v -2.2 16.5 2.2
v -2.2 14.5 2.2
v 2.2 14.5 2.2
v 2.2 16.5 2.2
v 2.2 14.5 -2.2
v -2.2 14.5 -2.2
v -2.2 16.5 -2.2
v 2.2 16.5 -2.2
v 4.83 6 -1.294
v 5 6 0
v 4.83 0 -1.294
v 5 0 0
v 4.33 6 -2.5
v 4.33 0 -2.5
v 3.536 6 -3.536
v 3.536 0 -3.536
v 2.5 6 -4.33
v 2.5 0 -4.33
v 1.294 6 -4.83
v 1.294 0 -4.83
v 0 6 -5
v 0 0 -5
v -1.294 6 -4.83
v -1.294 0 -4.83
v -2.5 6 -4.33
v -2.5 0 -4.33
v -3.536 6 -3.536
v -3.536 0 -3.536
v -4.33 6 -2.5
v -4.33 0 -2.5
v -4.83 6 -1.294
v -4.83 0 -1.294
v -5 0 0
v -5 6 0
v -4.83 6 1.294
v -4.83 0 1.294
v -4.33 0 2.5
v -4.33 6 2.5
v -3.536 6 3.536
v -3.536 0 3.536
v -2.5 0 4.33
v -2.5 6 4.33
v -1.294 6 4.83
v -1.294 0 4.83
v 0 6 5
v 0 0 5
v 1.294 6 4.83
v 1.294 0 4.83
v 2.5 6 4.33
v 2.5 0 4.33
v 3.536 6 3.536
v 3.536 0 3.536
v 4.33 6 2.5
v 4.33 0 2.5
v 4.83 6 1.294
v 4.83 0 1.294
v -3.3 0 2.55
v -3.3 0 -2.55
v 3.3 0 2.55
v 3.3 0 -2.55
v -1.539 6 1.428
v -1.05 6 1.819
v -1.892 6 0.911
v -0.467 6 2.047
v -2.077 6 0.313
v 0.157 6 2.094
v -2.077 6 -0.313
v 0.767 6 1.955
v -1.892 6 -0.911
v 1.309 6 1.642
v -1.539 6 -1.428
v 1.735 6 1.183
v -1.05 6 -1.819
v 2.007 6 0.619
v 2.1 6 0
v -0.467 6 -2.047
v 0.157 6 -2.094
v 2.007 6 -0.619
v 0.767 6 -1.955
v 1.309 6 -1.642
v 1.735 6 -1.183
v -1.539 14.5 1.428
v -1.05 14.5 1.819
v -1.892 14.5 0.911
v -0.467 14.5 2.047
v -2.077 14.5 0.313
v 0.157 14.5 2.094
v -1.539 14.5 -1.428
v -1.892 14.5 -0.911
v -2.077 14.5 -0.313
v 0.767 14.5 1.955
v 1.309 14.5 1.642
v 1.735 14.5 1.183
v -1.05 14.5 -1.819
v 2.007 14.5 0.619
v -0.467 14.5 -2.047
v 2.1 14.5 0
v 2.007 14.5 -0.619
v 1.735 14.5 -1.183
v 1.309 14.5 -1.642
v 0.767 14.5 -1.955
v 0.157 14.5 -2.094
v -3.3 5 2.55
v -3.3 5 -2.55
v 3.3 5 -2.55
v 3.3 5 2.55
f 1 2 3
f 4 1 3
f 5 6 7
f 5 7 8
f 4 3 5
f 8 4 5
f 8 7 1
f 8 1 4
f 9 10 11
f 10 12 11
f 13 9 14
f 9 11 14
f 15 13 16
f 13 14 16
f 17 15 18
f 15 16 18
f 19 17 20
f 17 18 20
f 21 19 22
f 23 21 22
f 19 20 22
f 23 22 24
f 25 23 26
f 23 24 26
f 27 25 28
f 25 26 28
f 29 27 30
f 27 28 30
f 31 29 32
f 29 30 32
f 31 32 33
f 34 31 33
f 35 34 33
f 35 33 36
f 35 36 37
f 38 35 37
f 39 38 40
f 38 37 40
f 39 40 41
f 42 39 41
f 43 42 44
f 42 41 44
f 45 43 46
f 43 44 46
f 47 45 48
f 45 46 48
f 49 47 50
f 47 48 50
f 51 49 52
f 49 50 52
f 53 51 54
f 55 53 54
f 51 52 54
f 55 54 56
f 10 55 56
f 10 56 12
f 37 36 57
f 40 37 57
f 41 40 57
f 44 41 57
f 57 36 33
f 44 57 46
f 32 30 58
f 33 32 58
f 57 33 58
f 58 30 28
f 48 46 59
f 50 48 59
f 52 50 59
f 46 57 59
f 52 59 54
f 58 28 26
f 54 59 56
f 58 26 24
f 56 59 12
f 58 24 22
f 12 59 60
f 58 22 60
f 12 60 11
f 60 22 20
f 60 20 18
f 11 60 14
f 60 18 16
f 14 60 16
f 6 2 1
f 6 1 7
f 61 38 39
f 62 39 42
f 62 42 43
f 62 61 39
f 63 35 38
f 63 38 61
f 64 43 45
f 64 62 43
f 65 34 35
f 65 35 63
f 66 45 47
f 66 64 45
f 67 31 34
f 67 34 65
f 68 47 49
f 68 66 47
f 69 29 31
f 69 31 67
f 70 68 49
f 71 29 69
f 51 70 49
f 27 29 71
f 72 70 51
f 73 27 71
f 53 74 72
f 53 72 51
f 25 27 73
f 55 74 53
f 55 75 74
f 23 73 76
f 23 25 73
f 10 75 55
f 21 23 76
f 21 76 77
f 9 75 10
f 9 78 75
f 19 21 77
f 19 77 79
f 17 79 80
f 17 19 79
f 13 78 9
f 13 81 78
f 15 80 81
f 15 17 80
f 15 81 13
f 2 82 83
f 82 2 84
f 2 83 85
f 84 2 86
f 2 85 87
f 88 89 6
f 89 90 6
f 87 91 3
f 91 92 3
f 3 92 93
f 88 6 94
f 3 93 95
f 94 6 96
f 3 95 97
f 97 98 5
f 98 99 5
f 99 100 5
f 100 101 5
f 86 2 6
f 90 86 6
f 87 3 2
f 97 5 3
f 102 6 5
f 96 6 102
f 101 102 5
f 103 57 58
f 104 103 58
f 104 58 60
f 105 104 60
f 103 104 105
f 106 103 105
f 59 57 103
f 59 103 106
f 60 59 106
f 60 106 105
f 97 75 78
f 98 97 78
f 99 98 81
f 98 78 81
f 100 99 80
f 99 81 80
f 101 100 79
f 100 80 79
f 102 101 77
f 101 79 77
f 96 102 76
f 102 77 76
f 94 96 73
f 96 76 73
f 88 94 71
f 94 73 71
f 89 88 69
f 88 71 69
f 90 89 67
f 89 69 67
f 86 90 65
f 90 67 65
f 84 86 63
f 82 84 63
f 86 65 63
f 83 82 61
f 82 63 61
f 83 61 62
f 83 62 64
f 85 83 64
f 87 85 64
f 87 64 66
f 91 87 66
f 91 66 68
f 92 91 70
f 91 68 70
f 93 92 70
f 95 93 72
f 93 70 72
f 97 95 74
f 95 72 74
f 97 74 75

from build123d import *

# Parameters (mm, degrees)
SKETCH1_R           = 5
SKETCH1_W           = 6.6
SKETCH1_H           = 5.1
BOSS_EXTRUDE1_DEPTH = 5
SKETCH2_R           = 5
BOSS_EXTRUDE2_DEPTH = 1
SKETCH3_R           = 2.1
BOSS_EXTRUDE3_DEPTH = 8.5
SKETCH4_W           = 4.4
SKETCH4_H           = 4.4
BOSS_EXTRUDE4_DEPTH = 2


with BuildPart() as part:
    # Sketch1 → Boss-Extrude1 (new body)
    with BuildSketch(Plane(origin=(0, 0, 0), x_dir=(1, 0, 0), z_dir=(0, 1, 0))):
        Circle(SKETCH1_R)
        Rectangle(SKETCH1_W, SKETCH1_H, mode=Mode.SUBTRACT)
    extrude(amount=BOSS_EXTRUDE1_DEPTH)

    # Sketch2 → Boss-Extrude2 (add)
    with BuildSketch(Plane(origin=(0, 5, 0), x_dir=(1, 0, 0), z_dir=(0, 1, 0))):
        Circle(SKETCH2_R)
    extrude(amount=BOSS_EXTRUDE2_DEPTH)

    # Sketch3 → Boss-Extrude3 (add)
    with BuildSketch(Plane(origin=(0, 6, 0), x_dir=(1, 0, 0), z_dir=(0, 1, 0))):
        Circle(SKETCH3_R)
    extrude(amount=BOSS_EXTRUDE3_DEPTH)

    # Sketch4 → Boss-Extrude4 (add)
    with BuildSketch(Plane(origin=(0, 14.5, 0), x_dir=(1, 0, 0), z_dir=(0, 1, 0))):
        Rectangle(SKETCH4_W, SKETCH4_H)
    extrude(amount=BOSS_EXTRUDE4_DEPTH)


solid = part.part
